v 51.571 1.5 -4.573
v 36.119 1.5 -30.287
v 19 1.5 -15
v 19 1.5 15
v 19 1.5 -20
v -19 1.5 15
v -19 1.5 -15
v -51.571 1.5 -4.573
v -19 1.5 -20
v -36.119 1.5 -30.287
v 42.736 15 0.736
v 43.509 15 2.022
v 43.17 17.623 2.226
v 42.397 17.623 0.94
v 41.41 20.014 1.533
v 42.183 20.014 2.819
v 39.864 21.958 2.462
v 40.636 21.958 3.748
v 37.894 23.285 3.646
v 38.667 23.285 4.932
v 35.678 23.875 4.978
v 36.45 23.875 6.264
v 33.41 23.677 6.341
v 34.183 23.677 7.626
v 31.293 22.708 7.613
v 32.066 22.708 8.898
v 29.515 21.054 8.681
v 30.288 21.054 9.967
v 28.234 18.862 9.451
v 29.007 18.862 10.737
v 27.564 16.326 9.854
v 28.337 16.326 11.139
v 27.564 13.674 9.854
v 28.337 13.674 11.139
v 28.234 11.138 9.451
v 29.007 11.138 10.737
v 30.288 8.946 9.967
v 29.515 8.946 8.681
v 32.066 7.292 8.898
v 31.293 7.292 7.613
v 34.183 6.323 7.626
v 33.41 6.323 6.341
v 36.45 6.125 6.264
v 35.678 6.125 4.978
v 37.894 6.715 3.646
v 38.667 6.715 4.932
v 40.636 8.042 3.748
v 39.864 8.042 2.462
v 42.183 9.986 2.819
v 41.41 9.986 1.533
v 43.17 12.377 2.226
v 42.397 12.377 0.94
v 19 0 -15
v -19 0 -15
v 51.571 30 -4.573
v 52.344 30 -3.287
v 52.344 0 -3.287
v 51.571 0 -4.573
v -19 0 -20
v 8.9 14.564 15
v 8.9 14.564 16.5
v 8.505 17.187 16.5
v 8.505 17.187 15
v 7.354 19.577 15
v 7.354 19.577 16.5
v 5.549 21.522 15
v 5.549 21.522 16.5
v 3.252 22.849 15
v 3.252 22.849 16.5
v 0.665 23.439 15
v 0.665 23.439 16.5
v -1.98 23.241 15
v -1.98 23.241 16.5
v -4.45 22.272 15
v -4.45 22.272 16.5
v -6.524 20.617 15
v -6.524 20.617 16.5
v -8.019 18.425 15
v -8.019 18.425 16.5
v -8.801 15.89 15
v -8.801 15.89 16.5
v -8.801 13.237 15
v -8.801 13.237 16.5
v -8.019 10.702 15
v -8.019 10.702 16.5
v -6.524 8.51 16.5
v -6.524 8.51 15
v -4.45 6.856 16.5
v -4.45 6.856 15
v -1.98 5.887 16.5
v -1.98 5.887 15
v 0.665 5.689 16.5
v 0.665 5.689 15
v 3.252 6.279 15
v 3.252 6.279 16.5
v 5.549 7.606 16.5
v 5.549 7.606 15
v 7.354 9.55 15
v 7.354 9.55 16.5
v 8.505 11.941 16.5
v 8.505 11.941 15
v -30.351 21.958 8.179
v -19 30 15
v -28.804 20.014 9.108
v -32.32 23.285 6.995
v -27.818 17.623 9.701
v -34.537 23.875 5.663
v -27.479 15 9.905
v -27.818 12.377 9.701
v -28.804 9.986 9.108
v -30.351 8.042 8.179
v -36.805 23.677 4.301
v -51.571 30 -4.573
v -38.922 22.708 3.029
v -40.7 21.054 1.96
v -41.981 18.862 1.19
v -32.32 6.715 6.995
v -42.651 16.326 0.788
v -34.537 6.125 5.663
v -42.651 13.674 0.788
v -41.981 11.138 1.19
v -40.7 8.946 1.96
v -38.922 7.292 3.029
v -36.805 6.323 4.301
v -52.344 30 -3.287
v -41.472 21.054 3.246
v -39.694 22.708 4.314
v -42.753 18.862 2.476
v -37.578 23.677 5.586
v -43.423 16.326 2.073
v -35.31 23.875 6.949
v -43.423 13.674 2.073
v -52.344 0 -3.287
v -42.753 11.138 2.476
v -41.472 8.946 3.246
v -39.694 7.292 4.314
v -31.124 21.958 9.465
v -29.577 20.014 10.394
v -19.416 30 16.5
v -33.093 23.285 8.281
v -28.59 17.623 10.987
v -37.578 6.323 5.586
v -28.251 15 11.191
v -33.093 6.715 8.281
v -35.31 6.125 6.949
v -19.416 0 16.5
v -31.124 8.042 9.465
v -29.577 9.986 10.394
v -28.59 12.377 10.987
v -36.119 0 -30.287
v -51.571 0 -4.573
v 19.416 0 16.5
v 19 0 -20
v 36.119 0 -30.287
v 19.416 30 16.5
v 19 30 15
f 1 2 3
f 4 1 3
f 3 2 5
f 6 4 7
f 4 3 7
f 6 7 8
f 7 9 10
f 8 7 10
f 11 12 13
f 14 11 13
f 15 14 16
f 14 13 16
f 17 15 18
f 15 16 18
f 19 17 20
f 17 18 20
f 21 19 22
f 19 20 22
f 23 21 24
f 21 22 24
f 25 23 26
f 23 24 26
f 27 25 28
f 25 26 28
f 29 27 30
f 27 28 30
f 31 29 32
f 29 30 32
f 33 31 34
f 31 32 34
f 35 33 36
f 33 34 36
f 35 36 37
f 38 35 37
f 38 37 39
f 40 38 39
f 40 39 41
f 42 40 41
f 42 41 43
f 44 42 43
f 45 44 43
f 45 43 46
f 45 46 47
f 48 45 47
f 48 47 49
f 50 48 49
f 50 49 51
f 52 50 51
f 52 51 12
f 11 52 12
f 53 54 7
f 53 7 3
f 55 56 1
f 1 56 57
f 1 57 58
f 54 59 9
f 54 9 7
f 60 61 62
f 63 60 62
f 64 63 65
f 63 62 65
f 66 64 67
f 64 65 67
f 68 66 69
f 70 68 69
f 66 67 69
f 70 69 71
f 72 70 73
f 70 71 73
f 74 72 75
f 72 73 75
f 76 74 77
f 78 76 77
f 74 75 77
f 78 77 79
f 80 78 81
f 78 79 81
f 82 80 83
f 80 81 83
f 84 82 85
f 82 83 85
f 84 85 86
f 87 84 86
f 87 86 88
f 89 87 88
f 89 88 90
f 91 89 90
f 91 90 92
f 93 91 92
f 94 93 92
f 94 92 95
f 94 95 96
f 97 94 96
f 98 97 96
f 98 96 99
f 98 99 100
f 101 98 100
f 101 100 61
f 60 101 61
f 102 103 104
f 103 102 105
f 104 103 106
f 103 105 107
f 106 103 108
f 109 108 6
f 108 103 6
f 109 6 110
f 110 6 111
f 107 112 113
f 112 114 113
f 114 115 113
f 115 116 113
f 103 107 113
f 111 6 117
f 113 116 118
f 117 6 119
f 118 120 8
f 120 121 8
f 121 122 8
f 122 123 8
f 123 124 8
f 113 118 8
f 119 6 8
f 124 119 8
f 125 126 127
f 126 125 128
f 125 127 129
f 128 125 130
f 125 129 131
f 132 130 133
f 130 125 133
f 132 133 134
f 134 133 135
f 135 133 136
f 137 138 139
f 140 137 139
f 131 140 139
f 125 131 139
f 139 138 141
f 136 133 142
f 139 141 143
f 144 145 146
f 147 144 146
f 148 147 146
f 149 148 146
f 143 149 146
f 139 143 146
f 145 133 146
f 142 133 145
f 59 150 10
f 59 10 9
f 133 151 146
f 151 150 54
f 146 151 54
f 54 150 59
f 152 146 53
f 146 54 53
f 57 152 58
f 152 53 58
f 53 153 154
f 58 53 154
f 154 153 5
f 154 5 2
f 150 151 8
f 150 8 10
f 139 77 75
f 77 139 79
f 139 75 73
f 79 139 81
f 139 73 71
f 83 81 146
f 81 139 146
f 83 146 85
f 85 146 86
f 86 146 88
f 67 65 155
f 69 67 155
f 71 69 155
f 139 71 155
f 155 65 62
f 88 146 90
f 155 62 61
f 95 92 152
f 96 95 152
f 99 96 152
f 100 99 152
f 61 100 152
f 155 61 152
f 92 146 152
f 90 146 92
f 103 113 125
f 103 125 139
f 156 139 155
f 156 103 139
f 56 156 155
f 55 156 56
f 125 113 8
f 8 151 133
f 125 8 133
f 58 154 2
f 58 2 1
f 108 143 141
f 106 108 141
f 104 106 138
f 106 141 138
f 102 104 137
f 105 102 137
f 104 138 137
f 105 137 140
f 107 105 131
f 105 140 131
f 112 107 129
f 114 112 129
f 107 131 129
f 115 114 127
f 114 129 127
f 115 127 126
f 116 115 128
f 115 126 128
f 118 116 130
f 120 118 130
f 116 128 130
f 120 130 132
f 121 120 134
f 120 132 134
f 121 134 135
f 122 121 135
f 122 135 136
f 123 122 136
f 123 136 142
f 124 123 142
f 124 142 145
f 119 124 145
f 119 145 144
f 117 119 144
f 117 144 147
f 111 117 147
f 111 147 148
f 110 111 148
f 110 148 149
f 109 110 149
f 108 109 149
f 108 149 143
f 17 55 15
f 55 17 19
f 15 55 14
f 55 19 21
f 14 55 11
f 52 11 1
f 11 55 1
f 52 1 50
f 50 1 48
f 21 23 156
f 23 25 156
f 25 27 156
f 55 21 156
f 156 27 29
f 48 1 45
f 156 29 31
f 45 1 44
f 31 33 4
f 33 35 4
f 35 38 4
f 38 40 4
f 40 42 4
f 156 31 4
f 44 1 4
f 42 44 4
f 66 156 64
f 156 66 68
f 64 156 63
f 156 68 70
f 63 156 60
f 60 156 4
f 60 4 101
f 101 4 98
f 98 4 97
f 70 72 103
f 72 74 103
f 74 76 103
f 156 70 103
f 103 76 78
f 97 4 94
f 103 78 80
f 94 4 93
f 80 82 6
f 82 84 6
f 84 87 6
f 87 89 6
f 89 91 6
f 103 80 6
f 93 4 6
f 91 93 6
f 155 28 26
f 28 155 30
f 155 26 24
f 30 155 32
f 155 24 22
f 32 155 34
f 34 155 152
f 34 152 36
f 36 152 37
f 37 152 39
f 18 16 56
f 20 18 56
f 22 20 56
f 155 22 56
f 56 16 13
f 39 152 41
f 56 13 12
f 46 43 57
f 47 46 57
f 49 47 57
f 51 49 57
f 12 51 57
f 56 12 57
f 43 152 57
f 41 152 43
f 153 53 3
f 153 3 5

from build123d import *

# Parameters (mm, degrees)
SALIENTE_EXTRUIR1_DEPTH = 1.5
SALIENTE_EXTRUIR2_DEPTH = 30
CROQUIS3_R              = 8.9
CORTAR_EXTRUIR1_DEPTH   = 30
CROQUIS4_R              = 8.9
CORTAR_EXTRUIR2_DEPTH   = 30
CROQUIS5_R              = 8.9
CORTAR_EXTRUIR3_DEPTH   = 30


with BuildPart() as part:
    # Croquis1 → Saliente-Extruir1 (new body)
    with BuildSketch(Plane(origin=(0, 0, 0), x_dir=(1, 0, 0), z_dir=(0, 1, 0))):
        Polygon((-19, -15), (-51.571428571, 4.572992638), (-36.119065962, 30.287278353), (-19, 20), (-19, 15), (19, 15), (19, 20), (36.119065962, 30.287278353), (51.571428571, 4.572992638), (19, -15), align=None)
    extrude(amount=SALIENTE_EXTRUIR1_DEPTH)

    # Croquis2 → Saliente-Extruir2 (add)
    with BuildSketch(Plane(origin=(0, 0, 0), x_dir=(1, 0, 0), z_dir=(0, 1, 0))):
        Polygon((-51.571428571, 4.572992638), (-52.344046702, 3.287278353), (-19.416025147, -16.5), (19.416025147, -16.5), (52.344046702, 3.287278353), (51.571428571, 4.572992638), (19, -15), (-19, -15), align=None)
    extrude(amount=SALIENTE_EXTRUIR2_DEPTH)

    # Croquis3 → Cortar-Extruir1 (cut)
    with BuildSketch(Plane.XY.offset(16.5)):
        with Locations((0, 14.563888597)):
            Circle(CROQUIS3_R)
    extrude(amount=-CORTAR_EXTRUIR1_DEPTH, mode=Mode.SUBTRACT)

    # Croquis4 → Cortar-Extruir2 (cut)
    with BuildSketch(Plane(origin=(12.435875575, 0, 20.694547865), x_dir=(0.8571428571428564, 0, -0.5150787536377139), z_dir=(0.5150787536377139, 0, 0.8571428571428564))):
        with Locations((27.351520408, 15)):
            Circle(CROQUIS4_R)
    extrude(amount=-CORTAR_EXTRUIR2_DEPTH, mode=Mode.SUBTRACT)

    # Croquis5 → Cortar-Extruir3 (cut)
    with BuildSketch(Plane(origin=(-12.435875575, 0, 20.694547865), x_dir=(0.8571428571428567, 0, 0.5150787536377137), z_dir=(-0.5150787536377136, 0, 0.8571428571428565))):
        with Locations((-27.351520408, 15)):
            Circle(CROQUIS5_R)
    extrude(amount=-CORTAR_EXTRUIR3_DEPTH, mode=Mode.SUBTRACT)


solid = part.part
